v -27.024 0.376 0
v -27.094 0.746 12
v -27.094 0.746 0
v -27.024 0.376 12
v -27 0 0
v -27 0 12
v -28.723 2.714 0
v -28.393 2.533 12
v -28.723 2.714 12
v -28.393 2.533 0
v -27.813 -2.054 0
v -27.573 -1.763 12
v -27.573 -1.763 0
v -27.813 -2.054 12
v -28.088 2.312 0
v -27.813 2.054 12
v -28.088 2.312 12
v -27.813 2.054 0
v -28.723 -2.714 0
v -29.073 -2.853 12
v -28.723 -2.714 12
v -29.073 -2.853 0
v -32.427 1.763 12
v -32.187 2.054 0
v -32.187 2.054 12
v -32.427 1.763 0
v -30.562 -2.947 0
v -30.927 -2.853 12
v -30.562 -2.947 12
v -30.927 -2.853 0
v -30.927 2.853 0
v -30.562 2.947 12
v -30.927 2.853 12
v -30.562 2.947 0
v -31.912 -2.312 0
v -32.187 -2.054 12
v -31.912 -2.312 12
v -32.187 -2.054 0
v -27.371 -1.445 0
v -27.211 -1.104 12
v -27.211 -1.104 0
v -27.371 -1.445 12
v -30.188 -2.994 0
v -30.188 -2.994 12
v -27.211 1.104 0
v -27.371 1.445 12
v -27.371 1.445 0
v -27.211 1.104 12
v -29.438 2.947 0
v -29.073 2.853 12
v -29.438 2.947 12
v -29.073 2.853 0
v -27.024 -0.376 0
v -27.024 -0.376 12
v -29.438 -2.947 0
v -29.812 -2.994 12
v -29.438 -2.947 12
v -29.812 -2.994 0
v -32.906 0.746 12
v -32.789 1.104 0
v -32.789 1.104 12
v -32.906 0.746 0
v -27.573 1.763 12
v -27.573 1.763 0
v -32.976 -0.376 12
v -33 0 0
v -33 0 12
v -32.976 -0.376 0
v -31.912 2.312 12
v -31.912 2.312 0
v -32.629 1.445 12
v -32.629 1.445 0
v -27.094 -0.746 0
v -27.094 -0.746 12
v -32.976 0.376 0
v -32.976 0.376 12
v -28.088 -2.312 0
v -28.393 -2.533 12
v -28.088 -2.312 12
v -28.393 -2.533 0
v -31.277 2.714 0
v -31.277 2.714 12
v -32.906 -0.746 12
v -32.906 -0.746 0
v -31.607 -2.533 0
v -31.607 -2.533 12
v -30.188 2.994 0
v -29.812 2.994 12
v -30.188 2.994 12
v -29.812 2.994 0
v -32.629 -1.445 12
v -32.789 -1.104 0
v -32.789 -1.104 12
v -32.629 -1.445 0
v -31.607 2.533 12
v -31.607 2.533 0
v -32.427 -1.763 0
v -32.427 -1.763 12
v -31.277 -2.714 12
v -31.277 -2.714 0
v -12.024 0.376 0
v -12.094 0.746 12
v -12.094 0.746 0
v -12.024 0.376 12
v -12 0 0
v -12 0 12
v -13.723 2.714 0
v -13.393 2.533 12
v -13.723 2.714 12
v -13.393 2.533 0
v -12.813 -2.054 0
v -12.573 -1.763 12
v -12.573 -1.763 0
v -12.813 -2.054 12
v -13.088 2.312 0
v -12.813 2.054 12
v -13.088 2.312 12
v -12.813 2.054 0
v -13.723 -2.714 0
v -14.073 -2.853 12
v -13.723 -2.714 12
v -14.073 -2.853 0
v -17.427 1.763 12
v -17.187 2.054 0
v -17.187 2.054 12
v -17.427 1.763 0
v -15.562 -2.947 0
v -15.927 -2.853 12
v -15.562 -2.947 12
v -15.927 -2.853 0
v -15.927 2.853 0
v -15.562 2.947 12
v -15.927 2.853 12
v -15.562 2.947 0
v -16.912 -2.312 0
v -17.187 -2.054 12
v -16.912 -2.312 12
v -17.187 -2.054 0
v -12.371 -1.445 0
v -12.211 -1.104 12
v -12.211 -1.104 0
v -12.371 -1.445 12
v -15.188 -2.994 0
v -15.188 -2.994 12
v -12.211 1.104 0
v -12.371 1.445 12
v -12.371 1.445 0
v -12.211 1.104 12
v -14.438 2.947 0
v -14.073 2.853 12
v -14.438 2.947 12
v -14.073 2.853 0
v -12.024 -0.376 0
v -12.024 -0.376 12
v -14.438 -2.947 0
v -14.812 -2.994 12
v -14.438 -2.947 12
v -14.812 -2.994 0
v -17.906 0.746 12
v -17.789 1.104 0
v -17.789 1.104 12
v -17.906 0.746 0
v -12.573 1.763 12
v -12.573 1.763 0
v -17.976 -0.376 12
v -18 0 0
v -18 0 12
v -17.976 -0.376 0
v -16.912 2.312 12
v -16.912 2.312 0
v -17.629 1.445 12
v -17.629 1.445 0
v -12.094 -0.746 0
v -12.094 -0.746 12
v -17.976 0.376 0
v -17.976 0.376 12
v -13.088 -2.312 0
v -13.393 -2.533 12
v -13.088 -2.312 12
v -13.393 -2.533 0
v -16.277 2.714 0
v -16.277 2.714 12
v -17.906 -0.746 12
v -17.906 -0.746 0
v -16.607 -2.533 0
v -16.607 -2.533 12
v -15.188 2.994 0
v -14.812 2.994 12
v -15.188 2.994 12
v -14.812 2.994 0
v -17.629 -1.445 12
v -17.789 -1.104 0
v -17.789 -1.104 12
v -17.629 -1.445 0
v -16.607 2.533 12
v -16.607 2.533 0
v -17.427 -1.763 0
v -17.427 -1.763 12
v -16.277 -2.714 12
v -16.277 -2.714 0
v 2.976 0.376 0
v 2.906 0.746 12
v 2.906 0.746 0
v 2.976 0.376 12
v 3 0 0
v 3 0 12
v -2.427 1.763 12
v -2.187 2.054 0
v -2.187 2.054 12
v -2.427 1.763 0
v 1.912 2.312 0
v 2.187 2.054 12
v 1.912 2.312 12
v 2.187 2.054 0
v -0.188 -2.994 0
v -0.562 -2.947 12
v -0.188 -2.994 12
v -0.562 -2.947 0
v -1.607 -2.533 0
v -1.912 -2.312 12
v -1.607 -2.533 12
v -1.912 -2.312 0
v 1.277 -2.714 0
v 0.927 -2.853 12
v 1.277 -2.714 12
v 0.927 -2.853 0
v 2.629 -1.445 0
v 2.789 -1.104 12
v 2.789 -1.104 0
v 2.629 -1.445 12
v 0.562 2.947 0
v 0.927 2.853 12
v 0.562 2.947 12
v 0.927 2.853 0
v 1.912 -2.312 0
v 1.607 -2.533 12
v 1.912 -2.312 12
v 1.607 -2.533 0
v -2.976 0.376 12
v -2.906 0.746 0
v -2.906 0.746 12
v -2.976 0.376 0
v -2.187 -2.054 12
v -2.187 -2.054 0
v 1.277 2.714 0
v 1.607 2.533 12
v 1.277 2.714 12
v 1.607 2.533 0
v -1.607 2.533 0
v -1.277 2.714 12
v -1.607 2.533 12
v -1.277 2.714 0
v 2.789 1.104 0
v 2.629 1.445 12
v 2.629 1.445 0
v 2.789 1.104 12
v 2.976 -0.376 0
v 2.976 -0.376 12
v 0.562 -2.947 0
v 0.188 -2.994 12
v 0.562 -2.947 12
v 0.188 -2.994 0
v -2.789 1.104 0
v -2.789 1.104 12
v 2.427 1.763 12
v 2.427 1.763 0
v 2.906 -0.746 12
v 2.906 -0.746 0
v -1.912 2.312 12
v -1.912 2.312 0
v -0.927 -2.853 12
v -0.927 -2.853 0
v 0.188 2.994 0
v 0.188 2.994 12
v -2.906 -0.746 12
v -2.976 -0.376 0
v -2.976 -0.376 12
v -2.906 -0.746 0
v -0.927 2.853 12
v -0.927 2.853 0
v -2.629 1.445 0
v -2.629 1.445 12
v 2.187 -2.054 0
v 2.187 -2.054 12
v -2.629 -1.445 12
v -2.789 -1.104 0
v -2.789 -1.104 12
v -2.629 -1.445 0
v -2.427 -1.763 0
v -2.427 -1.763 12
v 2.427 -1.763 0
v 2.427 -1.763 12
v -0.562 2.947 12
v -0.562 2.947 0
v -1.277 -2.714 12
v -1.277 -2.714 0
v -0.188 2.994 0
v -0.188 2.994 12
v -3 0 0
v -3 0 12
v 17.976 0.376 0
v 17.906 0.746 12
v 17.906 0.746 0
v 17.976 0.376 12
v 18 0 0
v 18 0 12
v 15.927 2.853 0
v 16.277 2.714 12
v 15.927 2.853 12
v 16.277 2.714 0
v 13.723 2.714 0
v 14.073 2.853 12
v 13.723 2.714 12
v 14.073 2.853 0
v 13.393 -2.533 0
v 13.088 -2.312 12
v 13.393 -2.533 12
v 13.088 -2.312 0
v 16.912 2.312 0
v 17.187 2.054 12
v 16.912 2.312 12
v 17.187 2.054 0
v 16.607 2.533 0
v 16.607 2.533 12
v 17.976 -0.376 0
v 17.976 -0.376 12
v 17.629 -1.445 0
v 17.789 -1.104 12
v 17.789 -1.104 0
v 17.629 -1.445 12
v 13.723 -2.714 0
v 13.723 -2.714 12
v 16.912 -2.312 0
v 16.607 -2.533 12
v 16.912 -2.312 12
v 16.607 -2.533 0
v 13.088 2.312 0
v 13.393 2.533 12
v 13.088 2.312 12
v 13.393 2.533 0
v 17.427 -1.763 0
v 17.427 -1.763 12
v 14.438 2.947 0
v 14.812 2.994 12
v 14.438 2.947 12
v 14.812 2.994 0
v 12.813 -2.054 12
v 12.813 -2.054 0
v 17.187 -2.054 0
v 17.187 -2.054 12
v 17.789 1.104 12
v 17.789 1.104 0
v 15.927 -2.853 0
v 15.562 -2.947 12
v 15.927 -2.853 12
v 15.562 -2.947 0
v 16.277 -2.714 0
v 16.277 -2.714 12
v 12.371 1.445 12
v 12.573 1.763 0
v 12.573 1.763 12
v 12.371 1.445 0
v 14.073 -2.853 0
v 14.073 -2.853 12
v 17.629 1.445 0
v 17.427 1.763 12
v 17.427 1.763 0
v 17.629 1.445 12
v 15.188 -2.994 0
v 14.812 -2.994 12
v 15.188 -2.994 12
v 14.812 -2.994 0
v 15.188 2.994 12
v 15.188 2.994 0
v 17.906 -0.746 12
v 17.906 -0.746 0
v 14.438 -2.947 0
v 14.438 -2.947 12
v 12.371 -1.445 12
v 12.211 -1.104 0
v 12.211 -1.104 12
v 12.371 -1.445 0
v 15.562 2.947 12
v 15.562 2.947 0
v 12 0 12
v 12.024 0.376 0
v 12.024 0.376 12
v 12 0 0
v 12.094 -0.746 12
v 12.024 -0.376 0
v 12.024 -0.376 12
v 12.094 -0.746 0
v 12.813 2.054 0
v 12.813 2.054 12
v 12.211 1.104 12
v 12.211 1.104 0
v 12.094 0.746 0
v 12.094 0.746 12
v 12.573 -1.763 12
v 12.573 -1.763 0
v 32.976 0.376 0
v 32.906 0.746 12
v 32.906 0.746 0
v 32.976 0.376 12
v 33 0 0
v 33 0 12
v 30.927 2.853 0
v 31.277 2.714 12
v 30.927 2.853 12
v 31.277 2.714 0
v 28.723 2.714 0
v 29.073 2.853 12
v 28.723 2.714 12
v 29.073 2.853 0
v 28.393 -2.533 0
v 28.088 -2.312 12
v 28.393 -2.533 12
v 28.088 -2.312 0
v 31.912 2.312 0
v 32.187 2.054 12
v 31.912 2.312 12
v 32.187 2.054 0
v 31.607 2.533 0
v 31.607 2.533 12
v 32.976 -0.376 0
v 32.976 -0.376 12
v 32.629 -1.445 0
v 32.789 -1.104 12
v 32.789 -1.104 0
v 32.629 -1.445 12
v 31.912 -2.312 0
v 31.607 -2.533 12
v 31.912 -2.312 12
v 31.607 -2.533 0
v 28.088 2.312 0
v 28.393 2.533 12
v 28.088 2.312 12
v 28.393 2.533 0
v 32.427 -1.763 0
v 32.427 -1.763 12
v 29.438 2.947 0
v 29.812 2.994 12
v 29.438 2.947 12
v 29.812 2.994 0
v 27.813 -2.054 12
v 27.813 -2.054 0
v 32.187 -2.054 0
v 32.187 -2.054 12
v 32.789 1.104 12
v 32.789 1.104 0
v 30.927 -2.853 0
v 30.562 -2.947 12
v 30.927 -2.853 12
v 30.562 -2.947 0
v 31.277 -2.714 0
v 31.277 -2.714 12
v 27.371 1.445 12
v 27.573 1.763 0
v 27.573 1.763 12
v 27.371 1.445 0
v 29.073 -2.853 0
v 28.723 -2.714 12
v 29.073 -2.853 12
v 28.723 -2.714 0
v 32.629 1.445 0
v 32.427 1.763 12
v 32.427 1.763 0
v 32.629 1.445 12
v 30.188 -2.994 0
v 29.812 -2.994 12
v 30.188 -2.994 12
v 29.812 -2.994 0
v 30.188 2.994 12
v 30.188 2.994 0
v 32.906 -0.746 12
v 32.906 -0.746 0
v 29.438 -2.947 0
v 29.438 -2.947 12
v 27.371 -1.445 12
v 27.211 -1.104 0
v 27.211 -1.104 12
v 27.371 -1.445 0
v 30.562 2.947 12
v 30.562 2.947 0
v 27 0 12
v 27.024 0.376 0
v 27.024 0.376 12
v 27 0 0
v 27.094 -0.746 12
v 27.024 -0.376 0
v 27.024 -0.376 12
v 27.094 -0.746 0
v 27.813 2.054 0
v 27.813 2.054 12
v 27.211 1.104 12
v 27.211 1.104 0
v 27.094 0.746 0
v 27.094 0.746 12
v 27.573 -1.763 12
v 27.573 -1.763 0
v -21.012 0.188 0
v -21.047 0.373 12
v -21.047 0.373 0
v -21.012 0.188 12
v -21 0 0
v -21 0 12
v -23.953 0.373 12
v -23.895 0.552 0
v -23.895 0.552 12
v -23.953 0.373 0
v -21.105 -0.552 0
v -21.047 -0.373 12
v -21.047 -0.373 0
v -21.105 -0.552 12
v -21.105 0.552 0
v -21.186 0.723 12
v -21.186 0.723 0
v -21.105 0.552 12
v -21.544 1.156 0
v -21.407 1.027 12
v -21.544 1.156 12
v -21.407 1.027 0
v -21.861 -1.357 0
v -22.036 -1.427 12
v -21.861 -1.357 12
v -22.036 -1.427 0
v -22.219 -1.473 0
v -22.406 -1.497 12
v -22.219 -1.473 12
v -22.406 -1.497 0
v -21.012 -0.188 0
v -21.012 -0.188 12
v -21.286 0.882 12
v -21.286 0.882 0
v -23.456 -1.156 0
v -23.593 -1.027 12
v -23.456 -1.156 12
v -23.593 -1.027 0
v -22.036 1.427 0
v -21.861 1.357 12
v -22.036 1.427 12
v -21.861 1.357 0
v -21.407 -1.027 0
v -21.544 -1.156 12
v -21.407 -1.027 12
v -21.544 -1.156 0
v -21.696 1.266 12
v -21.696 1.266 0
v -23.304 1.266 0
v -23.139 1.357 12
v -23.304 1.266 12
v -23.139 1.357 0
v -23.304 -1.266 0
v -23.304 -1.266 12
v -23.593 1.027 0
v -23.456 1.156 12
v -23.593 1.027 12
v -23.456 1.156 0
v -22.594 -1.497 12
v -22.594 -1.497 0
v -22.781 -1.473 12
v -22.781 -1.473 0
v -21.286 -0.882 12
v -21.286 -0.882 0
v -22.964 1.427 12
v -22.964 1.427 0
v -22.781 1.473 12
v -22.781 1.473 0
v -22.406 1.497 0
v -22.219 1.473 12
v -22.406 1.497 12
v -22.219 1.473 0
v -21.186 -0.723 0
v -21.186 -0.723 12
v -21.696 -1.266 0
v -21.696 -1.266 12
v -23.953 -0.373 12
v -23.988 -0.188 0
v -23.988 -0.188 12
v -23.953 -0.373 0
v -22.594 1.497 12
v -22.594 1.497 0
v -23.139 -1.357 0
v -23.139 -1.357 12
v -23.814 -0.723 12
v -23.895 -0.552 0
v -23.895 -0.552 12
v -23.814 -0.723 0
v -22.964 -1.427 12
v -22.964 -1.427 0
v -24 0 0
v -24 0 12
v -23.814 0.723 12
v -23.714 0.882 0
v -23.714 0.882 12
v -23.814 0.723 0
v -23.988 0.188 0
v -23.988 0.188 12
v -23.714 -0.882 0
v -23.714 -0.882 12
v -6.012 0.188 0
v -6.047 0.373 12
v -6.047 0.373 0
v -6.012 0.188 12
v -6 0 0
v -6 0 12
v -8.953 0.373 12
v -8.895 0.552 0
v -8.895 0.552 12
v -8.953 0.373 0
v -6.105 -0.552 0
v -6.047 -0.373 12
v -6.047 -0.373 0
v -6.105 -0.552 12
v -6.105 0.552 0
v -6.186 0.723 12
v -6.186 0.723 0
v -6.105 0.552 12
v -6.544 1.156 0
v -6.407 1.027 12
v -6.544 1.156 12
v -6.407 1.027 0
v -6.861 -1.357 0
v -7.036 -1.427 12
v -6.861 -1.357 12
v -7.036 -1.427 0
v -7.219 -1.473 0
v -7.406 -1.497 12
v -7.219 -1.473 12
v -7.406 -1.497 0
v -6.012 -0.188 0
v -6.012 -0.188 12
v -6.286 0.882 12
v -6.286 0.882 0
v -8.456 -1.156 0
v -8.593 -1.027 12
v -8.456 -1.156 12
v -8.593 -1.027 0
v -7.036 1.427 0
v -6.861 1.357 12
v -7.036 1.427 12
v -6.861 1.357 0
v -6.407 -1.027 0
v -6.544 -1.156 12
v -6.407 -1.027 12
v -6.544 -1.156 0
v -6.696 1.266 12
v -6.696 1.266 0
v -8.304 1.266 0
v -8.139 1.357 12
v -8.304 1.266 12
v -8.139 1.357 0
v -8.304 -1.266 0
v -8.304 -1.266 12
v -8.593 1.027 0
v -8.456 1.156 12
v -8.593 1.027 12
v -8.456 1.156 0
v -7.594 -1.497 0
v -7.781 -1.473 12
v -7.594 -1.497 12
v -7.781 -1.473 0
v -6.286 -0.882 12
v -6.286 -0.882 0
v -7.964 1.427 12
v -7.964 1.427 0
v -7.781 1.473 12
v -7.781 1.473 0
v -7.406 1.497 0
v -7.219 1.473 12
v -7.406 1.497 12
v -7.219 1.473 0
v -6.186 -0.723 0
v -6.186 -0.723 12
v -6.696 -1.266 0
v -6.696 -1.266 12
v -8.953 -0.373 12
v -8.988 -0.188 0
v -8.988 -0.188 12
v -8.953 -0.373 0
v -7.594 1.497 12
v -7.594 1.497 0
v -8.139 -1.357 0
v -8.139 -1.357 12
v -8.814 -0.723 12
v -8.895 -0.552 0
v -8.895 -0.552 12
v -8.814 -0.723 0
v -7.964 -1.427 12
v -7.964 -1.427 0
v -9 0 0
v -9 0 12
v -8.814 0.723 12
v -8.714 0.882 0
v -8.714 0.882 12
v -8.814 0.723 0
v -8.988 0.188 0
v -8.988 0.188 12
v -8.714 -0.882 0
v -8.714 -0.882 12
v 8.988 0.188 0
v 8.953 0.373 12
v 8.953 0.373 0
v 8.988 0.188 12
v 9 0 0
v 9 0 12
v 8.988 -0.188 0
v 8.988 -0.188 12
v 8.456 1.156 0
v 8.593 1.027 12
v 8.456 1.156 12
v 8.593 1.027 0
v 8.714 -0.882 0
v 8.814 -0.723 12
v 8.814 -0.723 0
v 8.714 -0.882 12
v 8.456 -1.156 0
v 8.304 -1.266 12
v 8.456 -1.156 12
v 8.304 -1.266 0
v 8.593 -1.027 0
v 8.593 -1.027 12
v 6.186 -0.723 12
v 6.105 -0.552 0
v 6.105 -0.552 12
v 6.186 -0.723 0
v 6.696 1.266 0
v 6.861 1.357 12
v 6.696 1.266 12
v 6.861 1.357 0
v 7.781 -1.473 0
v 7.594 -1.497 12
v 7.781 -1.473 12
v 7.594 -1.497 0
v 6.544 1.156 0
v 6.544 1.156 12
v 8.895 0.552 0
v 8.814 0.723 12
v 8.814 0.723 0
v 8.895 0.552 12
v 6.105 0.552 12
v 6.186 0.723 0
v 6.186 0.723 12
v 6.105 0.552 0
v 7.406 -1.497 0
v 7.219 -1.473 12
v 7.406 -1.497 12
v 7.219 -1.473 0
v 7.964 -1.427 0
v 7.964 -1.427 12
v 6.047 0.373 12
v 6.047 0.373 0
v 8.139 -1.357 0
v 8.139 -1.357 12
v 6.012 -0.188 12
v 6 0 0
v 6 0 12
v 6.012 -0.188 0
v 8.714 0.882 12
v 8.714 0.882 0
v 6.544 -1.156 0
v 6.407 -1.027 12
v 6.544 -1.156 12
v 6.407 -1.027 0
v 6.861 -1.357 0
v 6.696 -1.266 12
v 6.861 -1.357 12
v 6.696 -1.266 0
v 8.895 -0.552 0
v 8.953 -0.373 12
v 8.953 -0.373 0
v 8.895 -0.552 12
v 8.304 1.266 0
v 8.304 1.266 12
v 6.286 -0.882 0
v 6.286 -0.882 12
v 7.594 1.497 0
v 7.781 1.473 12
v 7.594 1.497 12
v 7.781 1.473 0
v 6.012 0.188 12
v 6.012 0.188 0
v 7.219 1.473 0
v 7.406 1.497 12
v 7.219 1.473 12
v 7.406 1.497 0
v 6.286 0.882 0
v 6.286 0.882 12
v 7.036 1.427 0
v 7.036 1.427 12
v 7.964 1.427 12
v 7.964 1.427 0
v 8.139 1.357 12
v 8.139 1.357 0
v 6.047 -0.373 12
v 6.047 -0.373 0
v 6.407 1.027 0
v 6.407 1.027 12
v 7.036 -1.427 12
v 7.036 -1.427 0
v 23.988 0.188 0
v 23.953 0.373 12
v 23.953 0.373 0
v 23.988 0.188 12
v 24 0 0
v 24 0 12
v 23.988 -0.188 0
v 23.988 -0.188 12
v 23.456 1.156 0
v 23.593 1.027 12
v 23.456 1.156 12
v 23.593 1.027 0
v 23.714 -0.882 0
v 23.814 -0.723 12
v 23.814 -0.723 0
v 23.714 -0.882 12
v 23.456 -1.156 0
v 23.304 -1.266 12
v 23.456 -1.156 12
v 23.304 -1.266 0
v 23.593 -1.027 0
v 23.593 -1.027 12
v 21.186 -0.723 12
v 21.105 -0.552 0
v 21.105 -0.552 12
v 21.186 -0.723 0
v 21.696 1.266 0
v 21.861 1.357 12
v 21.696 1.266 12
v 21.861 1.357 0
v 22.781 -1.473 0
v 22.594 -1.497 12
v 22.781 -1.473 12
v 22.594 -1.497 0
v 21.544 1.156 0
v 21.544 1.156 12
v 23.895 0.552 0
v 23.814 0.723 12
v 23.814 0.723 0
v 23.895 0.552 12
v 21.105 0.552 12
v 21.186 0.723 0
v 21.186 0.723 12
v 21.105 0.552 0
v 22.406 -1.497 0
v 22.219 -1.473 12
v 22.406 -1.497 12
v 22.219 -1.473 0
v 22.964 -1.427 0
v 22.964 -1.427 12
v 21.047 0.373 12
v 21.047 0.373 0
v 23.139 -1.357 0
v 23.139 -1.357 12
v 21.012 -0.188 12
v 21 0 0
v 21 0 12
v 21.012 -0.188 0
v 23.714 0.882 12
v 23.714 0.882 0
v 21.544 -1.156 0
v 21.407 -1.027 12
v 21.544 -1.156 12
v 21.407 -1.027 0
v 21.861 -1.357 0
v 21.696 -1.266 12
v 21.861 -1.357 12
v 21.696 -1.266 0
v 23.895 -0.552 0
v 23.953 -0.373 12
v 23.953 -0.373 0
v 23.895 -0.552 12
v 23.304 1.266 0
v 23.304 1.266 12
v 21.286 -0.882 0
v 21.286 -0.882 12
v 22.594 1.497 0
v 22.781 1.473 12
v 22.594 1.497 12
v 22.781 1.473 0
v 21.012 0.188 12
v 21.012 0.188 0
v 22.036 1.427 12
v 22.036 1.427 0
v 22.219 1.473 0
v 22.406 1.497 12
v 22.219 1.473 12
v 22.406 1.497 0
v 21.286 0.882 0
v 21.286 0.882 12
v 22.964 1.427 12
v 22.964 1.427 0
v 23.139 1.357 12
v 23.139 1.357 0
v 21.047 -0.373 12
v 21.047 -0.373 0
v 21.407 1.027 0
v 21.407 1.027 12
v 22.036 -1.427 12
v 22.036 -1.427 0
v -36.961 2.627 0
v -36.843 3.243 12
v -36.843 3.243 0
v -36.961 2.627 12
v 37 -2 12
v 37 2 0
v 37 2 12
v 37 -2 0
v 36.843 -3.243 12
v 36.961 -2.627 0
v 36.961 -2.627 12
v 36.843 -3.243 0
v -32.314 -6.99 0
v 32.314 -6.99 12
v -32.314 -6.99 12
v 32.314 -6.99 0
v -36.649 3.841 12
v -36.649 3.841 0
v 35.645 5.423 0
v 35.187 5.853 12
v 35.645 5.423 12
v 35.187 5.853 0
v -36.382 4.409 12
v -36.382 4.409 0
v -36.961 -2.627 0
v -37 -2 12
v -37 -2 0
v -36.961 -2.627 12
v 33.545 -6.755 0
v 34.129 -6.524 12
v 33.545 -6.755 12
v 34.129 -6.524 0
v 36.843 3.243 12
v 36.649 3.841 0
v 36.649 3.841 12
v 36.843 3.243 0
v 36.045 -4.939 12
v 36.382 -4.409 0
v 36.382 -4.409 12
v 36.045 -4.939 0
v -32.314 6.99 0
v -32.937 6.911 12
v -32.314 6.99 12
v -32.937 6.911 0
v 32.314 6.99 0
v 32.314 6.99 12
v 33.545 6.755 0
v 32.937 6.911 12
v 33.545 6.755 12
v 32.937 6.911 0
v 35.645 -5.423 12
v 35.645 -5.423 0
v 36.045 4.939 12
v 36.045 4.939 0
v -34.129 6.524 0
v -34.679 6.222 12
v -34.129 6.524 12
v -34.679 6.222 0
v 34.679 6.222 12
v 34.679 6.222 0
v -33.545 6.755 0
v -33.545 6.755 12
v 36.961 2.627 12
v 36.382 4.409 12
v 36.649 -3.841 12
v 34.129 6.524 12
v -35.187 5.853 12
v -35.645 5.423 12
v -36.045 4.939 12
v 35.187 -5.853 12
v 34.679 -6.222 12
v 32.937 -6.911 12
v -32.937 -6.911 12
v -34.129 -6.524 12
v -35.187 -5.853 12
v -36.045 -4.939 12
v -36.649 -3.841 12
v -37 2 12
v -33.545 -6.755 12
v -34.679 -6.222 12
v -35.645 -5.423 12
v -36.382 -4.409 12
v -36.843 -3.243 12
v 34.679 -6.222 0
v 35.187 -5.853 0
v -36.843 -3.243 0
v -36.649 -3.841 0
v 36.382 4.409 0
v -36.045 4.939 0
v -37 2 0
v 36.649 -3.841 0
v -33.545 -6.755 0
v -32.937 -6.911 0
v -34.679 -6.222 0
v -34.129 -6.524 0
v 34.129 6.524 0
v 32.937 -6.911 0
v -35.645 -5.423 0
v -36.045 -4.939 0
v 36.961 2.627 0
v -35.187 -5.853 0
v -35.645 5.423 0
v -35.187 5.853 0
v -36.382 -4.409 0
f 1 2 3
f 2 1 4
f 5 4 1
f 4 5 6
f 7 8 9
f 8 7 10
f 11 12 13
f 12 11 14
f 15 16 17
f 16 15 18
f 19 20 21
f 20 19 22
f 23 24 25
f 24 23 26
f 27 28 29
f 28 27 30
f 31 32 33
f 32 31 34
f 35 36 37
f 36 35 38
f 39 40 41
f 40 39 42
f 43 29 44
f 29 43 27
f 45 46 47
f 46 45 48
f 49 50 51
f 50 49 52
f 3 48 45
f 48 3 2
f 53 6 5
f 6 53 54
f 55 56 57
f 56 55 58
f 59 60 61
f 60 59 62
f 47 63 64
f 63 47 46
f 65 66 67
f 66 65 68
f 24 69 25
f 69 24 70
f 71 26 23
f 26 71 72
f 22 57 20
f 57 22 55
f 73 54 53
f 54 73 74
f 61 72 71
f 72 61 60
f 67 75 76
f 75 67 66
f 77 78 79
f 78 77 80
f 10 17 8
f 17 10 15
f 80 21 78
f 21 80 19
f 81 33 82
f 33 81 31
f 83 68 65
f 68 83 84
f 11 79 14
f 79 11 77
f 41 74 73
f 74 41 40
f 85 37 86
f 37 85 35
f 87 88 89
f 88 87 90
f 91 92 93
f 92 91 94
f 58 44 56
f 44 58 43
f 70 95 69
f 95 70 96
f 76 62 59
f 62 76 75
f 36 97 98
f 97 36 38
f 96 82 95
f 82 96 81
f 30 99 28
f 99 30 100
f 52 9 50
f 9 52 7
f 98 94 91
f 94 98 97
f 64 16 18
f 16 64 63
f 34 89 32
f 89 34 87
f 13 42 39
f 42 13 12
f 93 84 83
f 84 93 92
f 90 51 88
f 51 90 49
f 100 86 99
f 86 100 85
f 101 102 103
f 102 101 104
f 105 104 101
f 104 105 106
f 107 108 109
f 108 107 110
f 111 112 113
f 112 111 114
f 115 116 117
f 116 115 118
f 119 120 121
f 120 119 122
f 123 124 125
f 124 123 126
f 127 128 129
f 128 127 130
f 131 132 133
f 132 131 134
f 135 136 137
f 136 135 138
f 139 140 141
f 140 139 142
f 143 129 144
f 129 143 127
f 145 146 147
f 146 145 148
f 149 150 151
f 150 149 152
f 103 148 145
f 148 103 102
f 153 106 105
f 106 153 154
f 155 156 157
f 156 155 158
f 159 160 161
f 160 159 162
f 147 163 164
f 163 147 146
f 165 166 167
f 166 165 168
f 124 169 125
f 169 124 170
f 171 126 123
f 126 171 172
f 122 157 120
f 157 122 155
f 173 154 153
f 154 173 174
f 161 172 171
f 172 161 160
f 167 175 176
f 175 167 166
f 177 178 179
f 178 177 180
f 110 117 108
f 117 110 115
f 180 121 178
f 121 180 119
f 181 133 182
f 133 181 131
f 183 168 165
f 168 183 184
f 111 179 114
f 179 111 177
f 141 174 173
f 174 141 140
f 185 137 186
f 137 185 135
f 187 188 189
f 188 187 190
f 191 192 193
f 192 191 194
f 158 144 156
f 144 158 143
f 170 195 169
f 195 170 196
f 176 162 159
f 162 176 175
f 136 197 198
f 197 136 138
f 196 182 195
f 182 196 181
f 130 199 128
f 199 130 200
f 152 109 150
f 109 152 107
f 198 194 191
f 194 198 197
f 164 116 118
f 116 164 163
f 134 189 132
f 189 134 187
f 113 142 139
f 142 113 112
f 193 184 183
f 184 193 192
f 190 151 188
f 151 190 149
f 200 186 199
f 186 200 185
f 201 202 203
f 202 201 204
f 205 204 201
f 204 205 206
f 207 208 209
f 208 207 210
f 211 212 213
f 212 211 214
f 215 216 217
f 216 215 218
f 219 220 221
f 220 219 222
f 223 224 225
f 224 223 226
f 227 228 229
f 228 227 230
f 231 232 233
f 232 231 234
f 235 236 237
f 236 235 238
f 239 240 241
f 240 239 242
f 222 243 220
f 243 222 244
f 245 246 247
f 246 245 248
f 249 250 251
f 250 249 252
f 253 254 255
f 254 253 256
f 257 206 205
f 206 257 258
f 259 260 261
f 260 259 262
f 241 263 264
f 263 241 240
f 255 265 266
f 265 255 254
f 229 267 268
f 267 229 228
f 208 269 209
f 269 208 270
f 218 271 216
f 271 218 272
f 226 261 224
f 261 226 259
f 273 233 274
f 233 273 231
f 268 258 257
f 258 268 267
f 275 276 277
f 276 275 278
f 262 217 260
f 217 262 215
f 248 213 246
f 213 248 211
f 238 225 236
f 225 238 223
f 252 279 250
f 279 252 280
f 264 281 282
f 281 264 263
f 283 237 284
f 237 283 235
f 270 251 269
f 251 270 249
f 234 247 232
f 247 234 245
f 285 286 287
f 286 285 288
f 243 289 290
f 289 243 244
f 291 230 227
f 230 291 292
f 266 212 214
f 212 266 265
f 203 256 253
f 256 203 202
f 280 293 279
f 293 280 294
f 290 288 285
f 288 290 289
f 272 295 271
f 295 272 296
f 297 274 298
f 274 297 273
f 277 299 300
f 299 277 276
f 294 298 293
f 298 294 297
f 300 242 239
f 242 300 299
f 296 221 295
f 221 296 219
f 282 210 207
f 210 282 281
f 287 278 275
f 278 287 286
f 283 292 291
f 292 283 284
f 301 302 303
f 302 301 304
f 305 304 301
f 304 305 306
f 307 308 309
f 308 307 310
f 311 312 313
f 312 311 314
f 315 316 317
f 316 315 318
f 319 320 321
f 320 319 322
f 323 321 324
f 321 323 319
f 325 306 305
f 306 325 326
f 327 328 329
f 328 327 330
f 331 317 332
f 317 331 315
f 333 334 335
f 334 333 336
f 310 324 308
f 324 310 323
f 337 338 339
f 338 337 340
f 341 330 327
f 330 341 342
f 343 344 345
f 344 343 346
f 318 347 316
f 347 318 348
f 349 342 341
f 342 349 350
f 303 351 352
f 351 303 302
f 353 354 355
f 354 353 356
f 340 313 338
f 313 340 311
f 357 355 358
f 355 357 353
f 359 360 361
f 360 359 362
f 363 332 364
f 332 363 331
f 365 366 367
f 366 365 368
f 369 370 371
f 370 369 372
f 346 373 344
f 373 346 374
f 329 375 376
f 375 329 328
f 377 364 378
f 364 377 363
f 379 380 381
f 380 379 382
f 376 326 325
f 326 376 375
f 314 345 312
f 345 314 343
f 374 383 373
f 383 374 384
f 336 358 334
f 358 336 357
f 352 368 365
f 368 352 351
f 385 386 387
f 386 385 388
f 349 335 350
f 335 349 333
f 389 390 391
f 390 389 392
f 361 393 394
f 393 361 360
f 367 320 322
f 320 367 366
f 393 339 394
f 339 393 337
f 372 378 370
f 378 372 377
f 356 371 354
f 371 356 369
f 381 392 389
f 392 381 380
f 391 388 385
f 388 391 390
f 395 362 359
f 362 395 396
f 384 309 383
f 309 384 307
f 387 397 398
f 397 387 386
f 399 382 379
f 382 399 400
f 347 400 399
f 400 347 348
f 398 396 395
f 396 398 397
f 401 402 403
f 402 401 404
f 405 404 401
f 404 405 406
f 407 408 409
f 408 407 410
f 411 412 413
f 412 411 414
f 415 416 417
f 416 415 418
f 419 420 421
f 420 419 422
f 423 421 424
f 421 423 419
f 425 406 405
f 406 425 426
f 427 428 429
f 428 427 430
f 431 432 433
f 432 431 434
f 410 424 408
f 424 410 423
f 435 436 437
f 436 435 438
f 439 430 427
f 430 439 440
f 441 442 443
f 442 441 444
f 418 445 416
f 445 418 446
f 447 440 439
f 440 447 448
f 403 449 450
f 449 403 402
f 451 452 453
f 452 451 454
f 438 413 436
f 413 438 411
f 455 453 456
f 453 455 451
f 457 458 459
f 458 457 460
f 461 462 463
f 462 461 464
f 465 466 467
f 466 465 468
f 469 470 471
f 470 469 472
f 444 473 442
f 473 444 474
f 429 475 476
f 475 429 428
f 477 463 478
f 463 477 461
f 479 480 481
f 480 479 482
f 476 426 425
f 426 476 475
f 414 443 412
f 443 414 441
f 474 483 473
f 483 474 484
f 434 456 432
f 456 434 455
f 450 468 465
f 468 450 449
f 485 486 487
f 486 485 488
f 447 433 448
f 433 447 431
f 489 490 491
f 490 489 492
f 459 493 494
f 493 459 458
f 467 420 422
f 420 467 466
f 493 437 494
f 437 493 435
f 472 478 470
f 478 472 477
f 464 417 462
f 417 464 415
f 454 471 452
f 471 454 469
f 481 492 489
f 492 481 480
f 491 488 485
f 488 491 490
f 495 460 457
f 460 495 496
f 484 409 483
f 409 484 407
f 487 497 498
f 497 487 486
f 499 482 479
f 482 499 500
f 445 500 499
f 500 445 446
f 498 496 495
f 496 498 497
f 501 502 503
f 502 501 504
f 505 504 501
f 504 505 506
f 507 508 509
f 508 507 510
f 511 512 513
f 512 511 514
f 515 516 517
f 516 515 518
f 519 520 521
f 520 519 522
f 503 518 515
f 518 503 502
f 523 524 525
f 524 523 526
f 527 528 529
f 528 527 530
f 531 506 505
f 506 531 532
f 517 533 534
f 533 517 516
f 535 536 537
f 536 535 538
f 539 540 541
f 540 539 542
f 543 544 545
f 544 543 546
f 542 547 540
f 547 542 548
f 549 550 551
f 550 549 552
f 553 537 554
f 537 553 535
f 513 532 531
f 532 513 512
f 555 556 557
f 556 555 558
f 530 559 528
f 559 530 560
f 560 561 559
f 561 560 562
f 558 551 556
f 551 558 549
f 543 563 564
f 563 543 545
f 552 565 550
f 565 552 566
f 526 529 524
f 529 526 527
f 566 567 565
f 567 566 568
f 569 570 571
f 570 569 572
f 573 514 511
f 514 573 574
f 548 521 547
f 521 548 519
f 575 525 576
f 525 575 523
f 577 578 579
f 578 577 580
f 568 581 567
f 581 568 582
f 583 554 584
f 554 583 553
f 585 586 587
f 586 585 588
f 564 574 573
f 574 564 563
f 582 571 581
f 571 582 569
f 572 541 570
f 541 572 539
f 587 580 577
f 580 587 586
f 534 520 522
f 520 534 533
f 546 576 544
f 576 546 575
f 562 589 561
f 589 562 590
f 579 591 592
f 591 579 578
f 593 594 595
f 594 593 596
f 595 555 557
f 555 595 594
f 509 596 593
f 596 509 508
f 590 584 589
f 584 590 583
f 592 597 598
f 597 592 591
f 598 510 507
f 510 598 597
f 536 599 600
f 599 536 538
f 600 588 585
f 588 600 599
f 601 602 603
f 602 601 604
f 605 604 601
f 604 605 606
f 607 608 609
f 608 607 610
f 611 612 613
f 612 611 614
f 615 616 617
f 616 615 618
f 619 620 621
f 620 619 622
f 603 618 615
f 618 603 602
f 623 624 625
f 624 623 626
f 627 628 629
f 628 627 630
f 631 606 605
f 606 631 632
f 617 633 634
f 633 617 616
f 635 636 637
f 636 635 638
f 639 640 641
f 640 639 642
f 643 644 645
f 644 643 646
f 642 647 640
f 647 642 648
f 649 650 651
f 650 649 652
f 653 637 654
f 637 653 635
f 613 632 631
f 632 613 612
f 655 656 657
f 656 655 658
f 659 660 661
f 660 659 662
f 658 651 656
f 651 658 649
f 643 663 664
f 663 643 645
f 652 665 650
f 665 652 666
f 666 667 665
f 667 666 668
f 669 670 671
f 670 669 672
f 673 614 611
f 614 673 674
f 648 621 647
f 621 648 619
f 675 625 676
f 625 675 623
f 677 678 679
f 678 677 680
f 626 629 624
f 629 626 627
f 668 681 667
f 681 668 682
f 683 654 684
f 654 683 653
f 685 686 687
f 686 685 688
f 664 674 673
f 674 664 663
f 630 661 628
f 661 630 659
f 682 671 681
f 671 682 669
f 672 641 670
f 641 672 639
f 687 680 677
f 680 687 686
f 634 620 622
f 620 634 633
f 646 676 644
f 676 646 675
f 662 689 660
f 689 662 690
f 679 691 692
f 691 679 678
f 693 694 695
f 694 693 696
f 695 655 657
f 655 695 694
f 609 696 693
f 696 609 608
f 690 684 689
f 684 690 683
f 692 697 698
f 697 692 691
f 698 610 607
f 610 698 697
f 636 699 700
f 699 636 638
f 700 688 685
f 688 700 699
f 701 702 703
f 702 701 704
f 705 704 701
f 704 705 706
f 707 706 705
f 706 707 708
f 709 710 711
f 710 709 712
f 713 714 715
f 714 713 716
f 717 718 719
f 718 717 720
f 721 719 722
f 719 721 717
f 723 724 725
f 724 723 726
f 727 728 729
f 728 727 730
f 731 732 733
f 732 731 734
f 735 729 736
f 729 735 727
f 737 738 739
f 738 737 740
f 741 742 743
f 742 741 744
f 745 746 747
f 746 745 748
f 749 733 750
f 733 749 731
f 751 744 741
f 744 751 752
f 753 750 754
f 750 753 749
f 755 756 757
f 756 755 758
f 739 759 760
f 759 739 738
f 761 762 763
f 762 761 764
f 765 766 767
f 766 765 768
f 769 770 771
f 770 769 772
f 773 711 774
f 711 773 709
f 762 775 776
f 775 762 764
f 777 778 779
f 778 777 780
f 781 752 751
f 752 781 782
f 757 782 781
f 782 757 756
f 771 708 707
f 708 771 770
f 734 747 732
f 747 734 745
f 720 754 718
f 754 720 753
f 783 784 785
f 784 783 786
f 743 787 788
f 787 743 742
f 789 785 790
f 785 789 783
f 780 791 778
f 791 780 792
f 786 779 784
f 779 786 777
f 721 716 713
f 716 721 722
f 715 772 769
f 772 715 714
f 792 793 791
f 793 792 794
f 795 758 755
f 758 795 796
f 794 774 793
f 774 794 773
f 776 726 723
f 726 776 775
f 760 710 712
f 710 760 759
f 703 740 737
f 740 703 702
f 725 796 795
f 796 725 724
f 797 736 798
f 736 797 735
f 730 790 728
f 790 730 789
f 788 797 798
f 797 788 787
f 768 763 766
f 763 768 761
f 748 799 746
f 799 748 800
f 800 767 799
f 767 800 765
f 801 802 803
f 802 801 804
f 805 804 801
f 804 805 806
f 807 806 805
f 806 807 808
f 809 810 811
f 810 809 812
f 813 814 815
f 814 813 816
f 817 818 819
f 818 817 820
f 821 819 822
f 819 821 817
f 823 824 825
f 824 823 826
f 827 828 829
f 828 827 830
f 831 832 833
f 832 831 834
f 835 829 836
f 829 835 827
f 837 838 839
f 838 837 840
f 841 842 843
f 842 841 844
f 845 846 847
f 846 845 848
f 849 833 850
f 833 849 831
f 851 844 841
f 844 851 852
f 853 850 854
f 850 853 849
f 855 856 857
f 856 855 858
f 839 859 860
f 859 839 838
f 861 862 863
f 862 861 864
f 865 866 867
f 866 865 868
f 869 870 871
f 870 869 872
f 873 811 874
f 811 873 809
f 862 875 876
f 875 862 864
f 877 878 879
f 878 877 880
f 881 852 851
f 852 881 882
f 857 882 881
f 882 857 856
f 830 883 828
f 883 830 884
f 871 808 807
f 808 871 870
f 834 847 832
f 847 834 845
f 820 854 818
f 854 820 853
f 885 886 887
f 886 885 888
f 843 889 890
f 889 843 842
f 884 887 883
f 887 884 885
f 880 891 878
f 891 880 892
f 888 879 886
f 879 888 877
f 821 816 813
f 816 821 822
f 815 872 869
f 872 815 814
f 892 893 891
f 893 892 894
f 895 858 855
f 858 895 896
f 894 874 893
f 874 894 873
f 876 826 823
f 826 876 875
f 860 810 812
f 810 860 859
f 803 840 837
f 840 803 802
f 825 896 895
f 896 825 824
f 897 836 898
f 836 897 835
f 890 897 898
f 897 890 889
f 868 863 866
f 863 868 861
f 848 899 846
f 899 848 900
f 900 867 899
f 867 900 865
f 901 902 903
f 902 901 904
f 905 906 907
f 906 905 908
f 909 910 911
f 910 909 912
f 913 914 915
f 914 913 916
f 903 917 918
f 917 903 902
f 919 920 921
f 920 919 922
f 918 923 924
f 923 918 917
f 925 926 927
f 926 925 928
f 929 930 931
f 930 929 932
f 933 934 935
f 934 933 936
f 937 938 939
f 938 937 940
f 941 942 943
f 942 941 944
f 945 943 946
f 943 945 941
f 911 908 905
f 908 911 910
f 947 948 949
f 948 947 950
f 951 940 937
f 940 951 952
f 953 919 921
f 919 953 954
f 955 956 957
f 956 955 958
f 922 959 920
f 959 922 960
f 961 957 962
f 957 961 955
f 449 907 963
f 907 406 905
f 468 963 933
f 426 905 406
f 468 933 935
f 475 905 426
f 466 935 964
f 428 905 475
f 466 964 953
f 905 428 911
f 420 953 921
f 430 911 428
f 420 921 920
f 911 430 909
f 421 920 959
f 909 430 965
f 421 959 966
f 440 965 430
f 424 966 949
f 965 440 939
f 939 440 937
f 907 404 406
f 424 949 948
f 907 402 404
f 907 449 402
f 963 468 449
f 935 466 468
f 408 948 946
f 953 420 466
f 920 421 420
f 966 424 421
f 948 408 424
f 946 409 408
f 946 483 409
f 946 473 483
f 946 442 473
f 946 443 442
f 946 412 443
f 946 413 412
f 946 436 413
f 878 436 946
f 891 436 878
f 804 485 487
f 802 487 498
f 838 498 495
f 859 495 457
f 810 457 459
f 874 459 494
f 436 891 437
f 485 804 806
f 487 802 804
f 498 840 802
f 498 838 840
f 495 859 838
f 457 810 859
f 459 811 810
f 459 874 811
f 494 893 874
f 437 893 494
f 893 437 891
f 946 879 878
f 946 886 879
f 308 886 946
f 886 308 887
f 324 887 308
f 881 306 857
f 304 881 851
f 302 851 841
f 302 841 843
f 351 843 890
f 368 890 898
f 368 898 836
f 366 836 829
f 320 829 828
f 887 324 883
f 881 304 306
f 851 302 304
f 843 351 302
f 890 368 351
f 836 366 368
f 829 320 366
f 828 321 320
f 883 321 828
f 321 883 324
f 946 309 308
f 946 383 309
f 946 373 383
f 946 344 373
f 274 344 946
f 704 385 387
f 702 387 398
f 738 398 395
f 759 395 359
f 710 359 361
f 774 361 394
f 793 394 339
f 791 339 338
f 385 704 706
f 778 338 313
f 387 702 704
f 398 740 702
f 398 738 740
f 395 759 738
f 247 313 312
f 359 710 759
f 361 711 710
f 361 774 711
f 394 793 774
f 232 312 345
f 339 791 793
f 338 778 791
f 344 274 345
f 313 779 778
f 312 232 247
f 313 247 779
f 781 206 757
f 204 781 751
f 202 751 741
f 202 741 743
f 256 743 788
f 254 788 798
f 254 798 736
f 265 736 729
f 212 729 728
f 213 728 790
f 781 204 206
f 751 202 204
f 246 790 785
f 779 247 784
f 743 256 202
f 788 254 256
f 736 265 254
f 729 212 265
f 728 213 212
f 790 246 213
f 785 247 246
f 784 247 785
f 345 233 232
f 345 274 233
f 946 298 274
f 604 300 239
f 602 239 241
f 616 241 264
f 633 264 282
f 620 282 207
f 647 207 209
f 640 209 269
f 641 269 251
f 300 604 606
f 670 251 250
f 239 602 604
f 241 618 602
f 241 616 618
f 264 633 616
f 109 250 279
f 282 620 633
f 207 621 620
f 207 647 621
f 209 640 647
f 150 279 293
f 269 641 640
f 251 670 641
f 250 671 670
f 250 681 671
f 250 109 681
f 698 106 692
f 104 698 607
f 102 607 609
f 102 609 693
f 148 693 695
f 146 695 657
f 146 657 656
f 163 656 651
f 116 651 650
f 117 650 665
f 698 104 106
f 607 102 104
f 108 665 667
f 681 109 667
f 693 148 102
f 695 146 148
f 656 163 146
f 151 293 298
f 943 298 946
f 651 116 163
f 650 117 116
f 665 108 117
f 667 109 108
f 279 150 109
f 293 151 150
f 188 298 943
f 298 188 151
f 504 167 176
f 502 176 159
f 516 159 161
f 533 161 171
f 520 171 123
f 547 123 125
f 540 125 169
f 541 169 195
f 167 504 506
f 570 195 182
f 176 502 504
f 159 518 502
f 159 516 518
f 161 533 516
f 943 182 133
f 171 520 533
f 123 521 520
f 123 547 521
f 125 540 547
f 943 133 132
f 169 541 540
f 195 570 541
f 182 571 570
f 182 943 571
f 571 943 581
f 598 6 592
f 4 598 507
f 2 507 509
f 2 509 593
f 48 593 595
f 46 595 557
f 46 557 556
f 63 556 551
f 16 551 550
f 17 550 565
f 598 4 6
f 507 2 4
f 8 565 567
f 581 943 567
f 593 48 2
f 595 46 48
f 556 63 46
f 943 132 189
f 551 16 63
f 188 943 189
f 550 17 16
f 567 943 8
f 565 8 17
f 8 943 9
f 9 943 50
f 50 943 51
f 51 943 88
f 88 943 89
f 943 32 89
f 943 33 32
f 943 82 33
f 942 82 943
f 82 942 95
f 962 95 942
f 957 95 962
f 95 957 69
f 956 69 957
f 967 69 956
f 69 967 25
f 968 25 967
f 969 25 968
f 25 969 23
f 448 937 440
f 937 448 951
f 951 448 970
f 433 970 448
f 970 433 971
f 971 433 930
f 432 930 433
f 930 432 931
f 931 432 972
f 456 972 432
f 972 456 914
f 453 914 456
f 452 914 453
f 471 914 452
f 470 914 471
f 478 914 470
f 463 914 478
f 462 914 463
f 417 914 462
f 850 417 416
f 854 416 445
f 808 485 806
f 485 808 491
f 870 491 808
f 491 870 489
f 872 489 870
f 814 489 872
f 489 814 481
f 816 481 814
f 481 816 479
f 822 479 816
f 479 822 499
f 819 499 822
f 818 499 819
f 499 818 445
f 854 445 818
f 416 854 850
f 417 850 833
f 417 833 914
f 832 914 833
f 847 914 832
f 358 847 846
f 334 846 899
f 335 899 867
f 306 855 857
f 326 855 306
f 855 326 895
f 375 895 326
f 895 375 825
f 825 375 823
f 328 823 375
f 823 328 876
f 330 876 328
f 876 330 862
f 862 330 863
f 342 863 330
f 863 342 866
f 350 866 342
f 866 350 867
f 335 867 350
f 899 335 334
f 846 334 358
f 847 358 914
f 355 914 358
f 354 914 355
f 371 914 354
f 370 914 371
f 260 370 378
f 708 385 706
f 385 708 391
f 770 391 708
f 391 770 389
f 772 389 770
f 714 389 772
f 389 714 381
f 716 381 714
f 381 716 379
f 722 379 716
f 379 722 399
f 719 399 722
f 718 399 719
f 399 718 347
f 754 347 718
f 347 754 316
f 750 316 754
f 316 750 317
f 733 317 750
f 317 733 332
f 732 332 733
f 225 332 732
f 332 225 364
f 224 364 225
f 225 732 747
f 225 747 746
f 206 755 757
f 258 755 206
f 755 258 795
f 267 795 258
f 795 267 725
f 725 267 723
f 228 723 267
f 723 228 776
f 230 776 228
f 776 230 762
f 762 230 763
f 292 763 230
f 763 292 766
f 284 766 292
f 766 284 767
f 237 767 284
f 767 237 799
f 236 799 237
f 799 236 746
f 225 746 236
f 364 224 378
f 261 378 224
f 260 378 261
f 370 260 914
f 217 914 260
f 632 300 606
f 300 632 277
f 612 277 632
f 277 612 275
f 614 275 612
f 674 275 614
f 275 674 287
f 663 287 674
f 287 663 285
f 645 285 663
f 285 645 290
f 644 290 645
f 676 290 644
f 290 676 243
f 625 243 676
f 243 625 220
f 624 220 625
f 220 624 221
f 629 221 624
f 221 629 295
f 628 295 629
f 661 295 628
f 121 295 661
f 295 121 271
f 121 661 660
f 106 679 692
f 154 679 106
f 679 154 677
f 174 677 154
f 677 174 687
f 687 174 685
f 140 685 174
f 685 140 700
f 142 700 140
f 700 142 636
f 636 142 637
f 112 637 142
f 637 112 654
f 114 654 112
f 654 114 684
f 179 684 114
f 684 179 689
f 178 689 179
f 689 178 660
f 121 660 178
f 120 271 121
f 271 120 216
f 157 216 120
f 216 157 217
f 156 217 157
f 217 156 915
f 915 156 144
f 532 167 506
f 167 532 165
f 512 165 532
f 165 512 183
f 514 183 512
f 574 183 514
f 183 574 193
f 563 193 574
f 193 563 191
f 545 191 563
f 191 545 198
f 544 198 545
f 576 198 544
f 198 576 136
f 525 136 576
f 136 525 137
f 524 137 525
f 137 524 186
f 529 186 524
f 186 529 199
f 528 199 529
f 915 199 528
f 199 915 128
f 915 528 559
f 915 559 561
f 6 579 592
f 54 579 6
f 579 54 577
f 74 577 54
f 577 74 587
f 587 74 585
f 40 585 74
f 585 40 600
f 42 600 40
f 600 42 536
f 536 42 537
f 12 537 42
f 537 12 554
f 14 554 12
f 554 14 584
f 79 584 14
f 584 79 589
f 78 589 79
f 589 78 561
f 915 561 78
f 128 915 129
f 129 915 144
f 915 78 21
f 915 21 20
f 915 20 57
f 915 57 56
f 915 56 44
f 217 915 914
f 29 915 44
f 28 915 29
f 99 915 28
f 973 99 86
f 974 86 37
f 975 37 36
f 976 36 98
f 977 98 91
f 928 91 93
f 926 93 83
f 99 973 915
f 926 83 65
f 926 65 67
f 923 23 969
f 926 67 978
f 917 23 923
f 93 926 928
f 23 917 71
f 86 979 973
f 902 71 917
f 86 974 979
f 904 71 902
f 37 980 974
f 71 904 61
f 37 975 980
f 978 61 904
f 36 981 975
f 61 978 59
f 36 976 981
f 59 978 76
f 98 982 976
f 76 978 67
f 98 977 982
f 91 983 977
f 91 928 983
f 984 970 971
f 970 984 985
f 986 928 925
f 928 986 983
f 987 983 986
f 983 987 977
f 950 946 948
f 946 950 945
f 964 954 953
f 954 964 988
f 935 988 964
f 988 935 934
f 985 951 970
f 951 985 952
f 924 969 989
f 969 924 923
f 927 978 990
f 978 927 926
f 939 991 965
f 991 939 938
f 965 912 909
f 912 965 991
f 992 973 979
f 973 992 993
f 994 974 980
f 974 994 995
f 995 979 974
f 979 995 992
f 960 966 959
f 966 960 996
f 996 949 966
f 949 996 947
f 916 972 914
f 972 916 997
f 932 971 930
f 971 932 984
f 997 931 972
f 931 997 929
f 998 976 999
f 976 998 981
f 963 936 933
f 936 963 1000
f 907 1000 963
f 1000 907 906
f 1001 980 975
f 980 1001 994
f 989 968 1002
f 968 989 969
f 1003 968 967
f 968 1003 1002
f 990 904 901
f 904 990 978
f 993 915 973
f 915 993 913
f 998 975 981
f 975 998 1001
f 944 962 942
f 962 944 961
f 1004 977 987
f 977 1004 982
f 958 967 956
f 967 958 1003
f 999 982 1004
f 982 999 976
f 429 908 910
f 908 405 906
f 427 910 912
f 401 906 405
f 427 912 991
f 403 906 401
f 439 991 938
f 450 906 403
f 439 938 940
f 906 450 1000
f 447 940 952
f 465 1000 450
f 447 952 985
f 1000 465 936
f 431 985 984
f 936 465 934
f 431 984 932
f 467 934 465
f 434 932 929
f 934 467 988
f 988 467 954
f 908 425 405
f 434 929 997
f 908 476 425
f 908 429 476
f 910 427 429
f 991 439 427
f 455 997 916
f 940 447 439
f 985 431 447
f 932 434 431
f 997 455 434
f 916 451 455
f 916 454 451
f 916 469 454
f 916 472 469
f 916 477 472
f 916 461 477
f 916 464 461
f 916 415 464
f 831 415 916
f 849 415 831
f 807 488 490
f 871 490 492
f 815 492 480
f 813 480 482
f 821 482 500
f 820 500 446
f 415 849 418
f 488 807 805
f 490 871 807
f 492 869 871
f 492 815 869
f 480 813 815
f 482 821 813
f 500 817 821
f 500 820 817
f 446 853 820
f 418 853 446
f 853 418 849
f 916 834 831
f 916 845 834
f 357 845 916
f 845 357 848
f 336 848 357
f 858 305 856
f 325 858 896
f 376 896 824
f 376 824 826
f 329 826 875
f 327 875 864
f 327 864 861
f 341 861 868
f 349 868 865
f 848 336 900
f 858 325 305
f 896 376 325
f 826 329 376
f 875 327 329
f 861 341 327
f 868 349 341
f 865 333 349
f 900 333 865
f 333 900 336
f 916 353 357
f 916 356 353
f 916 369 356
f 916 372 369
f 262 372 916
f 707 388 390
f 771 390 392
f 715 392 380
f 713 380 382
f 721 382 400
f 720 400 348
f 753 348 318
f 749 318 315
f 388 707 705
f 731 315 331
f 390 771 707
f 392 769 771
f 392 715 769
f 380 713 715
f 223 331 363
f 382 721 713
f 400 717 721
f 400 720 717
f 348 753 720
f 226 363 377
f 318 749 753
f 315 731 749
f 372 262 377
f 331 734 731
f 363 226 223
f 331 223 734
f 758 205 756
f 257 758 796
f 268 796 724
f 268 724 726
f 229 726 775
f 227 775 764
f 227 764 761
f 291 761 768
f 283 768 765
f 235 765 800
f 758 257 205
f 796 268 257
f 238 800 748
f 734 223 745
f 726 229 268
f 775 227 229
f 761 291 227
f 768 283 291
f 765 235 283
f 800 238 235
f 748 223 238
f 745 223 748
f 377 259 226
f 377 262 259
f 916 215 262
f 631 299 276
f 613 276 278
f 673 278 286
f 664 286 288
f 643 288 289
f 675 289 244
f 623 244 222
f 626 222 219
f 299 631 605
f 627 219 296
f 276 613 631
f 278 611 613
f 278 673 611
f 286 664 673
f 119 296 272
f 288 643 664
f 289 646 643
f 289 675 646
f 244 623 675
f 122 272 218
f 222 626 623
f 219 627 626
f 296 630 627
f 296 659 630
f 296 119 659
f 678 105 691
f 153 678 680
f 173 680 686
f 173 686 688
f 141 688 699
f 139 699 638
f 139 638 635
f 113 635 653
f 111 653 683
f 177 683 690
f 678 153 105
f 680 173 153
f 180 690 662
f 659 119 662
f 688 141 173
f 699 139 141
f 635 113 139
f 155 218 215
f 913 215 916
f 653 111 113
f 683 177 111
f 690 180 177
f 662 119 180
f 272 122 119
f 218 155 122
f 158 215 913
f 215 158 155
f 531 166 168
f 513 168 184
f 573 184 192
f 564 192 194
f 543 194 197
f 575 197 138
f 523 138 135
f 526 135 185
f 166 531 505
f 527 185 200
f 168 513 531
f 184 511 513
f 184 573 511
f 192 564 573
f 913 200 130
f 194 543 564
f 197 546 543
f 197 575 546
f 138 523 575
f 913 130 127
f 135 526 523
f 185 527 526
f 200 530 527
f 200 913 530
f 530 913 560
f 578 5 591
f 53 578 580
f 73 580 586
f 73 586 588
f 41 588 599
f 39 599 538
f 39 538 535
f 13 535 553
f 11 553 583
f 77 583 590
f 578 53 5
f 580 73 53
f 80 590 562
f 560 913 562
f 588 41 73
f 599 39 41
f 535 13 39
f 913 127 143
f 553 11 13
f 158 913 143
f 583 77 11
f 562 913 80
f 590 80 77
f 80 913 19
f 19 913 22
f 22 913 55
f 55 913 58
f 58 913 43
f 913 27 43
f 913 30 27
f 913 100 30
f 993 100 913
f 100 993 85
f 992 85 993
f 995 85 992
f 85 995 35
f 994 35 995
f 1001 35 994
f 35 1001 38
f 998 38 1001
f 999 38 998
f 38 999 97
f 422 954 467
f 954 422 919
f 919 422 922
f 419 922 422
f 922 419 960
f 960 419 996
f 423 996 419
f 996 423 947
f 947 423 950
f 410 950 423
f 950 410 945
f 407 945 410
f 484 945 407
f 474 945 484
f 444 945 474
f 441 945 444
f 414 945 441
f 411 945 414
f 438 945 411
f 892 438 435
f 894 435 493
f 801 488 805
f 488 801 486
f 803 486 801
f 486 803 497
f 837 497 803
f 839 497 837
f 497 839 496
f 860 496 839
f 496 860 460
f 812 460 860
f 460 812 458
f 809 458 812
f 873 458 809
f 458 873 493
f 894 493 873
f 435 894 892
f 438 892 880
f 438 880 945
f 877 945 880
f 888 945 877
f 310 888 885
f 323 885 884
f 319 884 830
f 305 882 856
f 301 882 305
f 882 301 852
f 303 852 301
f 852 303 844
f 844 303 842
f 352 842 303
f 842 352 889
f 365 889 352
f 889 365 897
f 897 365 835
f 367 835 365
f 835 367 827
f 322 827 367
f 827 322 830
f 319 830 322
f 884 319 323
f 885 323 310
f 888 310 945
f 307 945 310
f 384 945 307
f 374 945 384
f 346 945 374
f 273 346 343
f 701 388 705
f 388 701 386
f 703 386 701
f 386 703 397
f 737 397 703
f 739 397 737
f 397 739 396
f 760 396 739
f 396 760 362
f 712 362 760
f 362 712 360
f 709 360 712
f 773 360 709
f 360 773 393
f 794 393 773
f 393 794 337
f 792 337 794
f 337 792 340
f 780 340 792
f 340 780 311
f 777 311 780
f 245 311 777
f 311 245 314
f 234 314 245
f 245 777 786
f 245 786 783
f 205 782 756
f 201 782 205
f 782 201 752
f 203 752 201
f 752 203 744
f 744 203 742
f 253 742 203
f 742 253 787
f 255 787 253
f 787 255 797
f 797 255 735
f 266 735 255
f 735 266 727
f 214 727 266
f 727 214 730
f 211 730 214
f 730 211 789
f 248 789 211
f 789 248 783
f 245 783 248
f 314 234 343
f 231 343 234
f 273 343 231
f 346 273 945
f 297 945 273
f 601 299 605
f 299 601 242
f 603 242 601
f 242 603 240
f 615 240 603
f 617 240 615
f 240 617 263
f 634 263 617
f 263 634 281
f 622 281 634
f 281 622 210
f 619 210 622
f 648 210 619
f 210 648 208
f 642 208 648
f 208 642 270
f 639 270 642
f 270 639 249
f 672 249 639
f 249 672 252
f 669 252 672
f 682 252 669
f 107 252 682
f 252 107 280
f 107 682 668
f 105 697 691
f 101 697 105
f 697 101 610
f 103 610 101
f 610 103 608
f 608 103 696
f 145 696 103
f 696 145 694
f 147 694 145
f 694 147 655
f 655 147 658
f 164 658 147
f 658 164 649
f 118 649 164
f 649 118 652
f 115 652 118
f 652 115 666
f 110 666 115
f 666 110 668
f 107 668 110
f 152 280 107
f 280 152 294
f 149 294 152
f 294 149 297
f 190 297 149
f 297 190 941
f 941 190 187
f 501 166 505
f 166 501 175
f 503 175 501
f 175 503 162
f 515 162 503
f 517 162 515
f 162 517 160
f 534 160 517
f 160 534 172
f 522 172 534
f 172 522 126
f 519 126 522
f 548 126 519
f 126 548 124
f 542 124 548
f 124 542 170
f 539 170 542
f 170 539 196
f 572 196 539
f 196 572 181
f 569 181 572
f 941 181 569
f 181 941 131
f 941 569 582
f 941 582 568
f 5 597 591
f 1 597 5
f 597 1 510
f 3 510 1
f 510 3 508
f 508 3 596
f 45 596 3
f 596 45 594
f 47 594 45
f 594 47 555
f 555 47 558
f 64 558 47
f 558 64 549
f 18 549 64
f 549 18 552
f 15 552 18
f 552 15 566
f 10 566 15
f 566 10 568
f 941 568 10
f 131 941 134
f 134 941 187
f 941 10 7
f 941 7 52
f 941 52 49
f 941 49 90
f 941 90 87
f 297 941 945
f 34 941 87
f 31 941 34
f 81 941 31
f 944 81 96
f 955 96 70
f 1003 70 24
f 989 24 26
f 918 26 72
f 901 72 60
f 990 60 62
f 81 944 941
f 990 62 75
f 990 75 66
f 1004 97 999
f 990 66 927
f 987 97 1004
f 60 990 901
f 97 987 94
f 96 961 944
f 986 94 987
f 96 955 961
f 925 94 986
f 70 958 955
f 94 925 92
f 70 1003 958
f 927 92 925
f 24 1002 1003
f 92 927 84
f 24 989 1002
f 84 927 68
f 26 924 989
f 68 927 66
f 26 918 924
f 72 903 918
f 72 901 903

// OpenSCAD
$fn = 50;


difference() {
	union() {
		translate(v = [0, 0, 0]) {
			rotate(a = [0, 0, 0]) {
				hull() {
					translate(v = [-32.0000000000, 2.0000000000, 0]) {
						rotate(a = [0, 0, 0]) {
							translate(v = [0, 0, 0]) {
								rotate(a = [0, 0, 0]) {
									cylinder(h = 12, r = 5);
								}
							}
						}
					}
					translate(v = [32.0000000000, 2.0000000000, 0]) {
						rotate(a = [0, 0, 0]) {
							translate(v = [0, 0, 0]) {
								rotate(a = [0, 0, 0]) {
									cylinder(h = 12, r = 5);
								}
							}
						}
					}
					translate(v = [-32.0000000000, -2.0000000000, 0]) {
						rotate(a = [0, 0, 0]) {
							translate(v = [0, 0, 0]) {
								rotate(a = [0, 0, 0]) {
									cylinder(h = 12, r = 5);
								}
							}
						}
					}
					translate(v = [32.0000000000, -2.0000000000, 0]) {
						rotate(a = [0, 0, 0]) {
							translate(v = [0, 0, 0]) {
								rotate(a = [0, 0, 0]) {
									cylinder(h = 12, r = 5);
								}
							}
						}
					}
				}
			}
		}
	}
	union() {
		translate(v = [-30.0000000000, 0.0000000000, 0]) {
			rotate(a = [0, 0, 0]) {
				translate(v = [0, 0, -50]) {
					rotate(a = [0, 0, 0]) {
						cylinder(h = 100, r = 3.0000000000);
					}
				}
			}
		}
		translate(v = [-15.0000000000, 0.0000000000, 0]) {
			rotate(a = [0, 0, 0]) {
				translate(v = [0, 0, -50]) {
					rotate(a = [0, 0, 0]) {
						cylinder(h = 100, r = 3.0000000000);
					}
				}
			}
		}
		translate(v = [0.0000000000, 0.0000000000, 0]) {
			rotate(a = [0, 0, 0]) {
				translate(v = [0, 0, -50]) {
					rotate(a = [0, 0, 0]) {
						cylinder(h = 100, r = 3.0000000000);
					}
				}
			}
		}
		translate(v = [15.0000000000, 0.0000000000, 0]) {
			rotate(a = [0, 0, 0]) {
				translate(v = [0, 0, -50]) {
					rotate(a = [0, 0, 0]) {
						cylinder(h = 100, r = 3.0000000000);
					}
				}
			}
		}
		translate(v = [30.0000000000, 0.0000000000, 0]) {
			rotate(a = [0, 0, 0]) {
				translate(v = [0, 0, -50]) {
					rotate(a = [0, 0, 0]) {
						cylinder(h = 100, r = 3.0000000000);
					}
				}
			}
		}
		translate(v = [-30.0000000000, 0.0000000000, 0]) {
			rotate(a = [0, 0, 0]) {
				translate(v = [0, 0, -50]) {
					rotate(a = [0, 0, 0]) {
						cylinder(h = 100, r = 1.5000000000);
					}
				}
			}
		}
		translate(v = [-22.5000000000, 0.0000000000, 0]) {
			rotate(a = [0, 0, 0]) {
				translate(v = [0, 0, -50]) {
					rotate(a = [0, 0, 0]) {
						cylinder(h = 100, r = 1.5000000000);
					}
				}
			}
		}
		translate(v = [-15.0000000000, 0.0000000000, 0]) {
			rotate(a = [0, 0, 0]) {
				translate(v = [0, 0, -50]) {
					rotate(a = [0, 0, 0]) {
						cylinder(h = 100, r = 1.5000000000);
					}
				}
			}
		}
		translate(v = [-7.5000000000, 0.0000000000, 0]) {
			rotate(a = [0, 0, 0]) {
				translate(v = [0, 0, -50]) {
					rotate(a = [0, 0, 0]) {
						cylinder(h = 100, r = 1.5000000000);
					}
				}
			}
		}
		translate(v = [0.0000000000, 0.0000000000, 0]) {
			rotate(a = [0, 0, 0]) {
				translate(v = [0, 0, -50]) {
					rotate(a = [0, 0, 0]) {
						cylinder(h = 100, r = 1.5000000000);
					}
				}
			}
		}
		translate(v = [7.5000000000, 0.0000000000, 0]) {
			rotate(a = [0, 0, 0]) {
				translate(v = [0, 0, -50]) {
					rotate(a = [0, 0, 0]) {
						cylinder(h = 100, r = 1.5000000000);
					}
				}
			}
		}
		translate(v = [15.0000000000, 0.0000000000, 0]) {
			rotate(a = [0, 0, 0]) {
				translate(v = [0, 0, -50]) {
					rotate(a = [0, 0, 0]) {
						cylinder(h = 100, r = 1.5000000000);
					}
				}
			}
		}
		translate(v = [22.5000000000, 0.0000000000, 0]) {
			rotate(a = [0, 0, 0]) {
				translate(v = [0, 0, -50]) {
					rotate(a = [0, 0, 0]) {
						cylinder(h = 100, r = 1.5000000000);
					}
				}
			}
		}
		translate(v = [30.0000000000, 0.0000000000, 0]) {
			rotate(a = [0, 0, 0]) {
				translate(v = [0, 0, -50]) {
					rotate(a = [0, 0, 0]) {
						cylinder(h = 100, r = 1.5000000000);
					}
				}
			}
		}
	}
}
